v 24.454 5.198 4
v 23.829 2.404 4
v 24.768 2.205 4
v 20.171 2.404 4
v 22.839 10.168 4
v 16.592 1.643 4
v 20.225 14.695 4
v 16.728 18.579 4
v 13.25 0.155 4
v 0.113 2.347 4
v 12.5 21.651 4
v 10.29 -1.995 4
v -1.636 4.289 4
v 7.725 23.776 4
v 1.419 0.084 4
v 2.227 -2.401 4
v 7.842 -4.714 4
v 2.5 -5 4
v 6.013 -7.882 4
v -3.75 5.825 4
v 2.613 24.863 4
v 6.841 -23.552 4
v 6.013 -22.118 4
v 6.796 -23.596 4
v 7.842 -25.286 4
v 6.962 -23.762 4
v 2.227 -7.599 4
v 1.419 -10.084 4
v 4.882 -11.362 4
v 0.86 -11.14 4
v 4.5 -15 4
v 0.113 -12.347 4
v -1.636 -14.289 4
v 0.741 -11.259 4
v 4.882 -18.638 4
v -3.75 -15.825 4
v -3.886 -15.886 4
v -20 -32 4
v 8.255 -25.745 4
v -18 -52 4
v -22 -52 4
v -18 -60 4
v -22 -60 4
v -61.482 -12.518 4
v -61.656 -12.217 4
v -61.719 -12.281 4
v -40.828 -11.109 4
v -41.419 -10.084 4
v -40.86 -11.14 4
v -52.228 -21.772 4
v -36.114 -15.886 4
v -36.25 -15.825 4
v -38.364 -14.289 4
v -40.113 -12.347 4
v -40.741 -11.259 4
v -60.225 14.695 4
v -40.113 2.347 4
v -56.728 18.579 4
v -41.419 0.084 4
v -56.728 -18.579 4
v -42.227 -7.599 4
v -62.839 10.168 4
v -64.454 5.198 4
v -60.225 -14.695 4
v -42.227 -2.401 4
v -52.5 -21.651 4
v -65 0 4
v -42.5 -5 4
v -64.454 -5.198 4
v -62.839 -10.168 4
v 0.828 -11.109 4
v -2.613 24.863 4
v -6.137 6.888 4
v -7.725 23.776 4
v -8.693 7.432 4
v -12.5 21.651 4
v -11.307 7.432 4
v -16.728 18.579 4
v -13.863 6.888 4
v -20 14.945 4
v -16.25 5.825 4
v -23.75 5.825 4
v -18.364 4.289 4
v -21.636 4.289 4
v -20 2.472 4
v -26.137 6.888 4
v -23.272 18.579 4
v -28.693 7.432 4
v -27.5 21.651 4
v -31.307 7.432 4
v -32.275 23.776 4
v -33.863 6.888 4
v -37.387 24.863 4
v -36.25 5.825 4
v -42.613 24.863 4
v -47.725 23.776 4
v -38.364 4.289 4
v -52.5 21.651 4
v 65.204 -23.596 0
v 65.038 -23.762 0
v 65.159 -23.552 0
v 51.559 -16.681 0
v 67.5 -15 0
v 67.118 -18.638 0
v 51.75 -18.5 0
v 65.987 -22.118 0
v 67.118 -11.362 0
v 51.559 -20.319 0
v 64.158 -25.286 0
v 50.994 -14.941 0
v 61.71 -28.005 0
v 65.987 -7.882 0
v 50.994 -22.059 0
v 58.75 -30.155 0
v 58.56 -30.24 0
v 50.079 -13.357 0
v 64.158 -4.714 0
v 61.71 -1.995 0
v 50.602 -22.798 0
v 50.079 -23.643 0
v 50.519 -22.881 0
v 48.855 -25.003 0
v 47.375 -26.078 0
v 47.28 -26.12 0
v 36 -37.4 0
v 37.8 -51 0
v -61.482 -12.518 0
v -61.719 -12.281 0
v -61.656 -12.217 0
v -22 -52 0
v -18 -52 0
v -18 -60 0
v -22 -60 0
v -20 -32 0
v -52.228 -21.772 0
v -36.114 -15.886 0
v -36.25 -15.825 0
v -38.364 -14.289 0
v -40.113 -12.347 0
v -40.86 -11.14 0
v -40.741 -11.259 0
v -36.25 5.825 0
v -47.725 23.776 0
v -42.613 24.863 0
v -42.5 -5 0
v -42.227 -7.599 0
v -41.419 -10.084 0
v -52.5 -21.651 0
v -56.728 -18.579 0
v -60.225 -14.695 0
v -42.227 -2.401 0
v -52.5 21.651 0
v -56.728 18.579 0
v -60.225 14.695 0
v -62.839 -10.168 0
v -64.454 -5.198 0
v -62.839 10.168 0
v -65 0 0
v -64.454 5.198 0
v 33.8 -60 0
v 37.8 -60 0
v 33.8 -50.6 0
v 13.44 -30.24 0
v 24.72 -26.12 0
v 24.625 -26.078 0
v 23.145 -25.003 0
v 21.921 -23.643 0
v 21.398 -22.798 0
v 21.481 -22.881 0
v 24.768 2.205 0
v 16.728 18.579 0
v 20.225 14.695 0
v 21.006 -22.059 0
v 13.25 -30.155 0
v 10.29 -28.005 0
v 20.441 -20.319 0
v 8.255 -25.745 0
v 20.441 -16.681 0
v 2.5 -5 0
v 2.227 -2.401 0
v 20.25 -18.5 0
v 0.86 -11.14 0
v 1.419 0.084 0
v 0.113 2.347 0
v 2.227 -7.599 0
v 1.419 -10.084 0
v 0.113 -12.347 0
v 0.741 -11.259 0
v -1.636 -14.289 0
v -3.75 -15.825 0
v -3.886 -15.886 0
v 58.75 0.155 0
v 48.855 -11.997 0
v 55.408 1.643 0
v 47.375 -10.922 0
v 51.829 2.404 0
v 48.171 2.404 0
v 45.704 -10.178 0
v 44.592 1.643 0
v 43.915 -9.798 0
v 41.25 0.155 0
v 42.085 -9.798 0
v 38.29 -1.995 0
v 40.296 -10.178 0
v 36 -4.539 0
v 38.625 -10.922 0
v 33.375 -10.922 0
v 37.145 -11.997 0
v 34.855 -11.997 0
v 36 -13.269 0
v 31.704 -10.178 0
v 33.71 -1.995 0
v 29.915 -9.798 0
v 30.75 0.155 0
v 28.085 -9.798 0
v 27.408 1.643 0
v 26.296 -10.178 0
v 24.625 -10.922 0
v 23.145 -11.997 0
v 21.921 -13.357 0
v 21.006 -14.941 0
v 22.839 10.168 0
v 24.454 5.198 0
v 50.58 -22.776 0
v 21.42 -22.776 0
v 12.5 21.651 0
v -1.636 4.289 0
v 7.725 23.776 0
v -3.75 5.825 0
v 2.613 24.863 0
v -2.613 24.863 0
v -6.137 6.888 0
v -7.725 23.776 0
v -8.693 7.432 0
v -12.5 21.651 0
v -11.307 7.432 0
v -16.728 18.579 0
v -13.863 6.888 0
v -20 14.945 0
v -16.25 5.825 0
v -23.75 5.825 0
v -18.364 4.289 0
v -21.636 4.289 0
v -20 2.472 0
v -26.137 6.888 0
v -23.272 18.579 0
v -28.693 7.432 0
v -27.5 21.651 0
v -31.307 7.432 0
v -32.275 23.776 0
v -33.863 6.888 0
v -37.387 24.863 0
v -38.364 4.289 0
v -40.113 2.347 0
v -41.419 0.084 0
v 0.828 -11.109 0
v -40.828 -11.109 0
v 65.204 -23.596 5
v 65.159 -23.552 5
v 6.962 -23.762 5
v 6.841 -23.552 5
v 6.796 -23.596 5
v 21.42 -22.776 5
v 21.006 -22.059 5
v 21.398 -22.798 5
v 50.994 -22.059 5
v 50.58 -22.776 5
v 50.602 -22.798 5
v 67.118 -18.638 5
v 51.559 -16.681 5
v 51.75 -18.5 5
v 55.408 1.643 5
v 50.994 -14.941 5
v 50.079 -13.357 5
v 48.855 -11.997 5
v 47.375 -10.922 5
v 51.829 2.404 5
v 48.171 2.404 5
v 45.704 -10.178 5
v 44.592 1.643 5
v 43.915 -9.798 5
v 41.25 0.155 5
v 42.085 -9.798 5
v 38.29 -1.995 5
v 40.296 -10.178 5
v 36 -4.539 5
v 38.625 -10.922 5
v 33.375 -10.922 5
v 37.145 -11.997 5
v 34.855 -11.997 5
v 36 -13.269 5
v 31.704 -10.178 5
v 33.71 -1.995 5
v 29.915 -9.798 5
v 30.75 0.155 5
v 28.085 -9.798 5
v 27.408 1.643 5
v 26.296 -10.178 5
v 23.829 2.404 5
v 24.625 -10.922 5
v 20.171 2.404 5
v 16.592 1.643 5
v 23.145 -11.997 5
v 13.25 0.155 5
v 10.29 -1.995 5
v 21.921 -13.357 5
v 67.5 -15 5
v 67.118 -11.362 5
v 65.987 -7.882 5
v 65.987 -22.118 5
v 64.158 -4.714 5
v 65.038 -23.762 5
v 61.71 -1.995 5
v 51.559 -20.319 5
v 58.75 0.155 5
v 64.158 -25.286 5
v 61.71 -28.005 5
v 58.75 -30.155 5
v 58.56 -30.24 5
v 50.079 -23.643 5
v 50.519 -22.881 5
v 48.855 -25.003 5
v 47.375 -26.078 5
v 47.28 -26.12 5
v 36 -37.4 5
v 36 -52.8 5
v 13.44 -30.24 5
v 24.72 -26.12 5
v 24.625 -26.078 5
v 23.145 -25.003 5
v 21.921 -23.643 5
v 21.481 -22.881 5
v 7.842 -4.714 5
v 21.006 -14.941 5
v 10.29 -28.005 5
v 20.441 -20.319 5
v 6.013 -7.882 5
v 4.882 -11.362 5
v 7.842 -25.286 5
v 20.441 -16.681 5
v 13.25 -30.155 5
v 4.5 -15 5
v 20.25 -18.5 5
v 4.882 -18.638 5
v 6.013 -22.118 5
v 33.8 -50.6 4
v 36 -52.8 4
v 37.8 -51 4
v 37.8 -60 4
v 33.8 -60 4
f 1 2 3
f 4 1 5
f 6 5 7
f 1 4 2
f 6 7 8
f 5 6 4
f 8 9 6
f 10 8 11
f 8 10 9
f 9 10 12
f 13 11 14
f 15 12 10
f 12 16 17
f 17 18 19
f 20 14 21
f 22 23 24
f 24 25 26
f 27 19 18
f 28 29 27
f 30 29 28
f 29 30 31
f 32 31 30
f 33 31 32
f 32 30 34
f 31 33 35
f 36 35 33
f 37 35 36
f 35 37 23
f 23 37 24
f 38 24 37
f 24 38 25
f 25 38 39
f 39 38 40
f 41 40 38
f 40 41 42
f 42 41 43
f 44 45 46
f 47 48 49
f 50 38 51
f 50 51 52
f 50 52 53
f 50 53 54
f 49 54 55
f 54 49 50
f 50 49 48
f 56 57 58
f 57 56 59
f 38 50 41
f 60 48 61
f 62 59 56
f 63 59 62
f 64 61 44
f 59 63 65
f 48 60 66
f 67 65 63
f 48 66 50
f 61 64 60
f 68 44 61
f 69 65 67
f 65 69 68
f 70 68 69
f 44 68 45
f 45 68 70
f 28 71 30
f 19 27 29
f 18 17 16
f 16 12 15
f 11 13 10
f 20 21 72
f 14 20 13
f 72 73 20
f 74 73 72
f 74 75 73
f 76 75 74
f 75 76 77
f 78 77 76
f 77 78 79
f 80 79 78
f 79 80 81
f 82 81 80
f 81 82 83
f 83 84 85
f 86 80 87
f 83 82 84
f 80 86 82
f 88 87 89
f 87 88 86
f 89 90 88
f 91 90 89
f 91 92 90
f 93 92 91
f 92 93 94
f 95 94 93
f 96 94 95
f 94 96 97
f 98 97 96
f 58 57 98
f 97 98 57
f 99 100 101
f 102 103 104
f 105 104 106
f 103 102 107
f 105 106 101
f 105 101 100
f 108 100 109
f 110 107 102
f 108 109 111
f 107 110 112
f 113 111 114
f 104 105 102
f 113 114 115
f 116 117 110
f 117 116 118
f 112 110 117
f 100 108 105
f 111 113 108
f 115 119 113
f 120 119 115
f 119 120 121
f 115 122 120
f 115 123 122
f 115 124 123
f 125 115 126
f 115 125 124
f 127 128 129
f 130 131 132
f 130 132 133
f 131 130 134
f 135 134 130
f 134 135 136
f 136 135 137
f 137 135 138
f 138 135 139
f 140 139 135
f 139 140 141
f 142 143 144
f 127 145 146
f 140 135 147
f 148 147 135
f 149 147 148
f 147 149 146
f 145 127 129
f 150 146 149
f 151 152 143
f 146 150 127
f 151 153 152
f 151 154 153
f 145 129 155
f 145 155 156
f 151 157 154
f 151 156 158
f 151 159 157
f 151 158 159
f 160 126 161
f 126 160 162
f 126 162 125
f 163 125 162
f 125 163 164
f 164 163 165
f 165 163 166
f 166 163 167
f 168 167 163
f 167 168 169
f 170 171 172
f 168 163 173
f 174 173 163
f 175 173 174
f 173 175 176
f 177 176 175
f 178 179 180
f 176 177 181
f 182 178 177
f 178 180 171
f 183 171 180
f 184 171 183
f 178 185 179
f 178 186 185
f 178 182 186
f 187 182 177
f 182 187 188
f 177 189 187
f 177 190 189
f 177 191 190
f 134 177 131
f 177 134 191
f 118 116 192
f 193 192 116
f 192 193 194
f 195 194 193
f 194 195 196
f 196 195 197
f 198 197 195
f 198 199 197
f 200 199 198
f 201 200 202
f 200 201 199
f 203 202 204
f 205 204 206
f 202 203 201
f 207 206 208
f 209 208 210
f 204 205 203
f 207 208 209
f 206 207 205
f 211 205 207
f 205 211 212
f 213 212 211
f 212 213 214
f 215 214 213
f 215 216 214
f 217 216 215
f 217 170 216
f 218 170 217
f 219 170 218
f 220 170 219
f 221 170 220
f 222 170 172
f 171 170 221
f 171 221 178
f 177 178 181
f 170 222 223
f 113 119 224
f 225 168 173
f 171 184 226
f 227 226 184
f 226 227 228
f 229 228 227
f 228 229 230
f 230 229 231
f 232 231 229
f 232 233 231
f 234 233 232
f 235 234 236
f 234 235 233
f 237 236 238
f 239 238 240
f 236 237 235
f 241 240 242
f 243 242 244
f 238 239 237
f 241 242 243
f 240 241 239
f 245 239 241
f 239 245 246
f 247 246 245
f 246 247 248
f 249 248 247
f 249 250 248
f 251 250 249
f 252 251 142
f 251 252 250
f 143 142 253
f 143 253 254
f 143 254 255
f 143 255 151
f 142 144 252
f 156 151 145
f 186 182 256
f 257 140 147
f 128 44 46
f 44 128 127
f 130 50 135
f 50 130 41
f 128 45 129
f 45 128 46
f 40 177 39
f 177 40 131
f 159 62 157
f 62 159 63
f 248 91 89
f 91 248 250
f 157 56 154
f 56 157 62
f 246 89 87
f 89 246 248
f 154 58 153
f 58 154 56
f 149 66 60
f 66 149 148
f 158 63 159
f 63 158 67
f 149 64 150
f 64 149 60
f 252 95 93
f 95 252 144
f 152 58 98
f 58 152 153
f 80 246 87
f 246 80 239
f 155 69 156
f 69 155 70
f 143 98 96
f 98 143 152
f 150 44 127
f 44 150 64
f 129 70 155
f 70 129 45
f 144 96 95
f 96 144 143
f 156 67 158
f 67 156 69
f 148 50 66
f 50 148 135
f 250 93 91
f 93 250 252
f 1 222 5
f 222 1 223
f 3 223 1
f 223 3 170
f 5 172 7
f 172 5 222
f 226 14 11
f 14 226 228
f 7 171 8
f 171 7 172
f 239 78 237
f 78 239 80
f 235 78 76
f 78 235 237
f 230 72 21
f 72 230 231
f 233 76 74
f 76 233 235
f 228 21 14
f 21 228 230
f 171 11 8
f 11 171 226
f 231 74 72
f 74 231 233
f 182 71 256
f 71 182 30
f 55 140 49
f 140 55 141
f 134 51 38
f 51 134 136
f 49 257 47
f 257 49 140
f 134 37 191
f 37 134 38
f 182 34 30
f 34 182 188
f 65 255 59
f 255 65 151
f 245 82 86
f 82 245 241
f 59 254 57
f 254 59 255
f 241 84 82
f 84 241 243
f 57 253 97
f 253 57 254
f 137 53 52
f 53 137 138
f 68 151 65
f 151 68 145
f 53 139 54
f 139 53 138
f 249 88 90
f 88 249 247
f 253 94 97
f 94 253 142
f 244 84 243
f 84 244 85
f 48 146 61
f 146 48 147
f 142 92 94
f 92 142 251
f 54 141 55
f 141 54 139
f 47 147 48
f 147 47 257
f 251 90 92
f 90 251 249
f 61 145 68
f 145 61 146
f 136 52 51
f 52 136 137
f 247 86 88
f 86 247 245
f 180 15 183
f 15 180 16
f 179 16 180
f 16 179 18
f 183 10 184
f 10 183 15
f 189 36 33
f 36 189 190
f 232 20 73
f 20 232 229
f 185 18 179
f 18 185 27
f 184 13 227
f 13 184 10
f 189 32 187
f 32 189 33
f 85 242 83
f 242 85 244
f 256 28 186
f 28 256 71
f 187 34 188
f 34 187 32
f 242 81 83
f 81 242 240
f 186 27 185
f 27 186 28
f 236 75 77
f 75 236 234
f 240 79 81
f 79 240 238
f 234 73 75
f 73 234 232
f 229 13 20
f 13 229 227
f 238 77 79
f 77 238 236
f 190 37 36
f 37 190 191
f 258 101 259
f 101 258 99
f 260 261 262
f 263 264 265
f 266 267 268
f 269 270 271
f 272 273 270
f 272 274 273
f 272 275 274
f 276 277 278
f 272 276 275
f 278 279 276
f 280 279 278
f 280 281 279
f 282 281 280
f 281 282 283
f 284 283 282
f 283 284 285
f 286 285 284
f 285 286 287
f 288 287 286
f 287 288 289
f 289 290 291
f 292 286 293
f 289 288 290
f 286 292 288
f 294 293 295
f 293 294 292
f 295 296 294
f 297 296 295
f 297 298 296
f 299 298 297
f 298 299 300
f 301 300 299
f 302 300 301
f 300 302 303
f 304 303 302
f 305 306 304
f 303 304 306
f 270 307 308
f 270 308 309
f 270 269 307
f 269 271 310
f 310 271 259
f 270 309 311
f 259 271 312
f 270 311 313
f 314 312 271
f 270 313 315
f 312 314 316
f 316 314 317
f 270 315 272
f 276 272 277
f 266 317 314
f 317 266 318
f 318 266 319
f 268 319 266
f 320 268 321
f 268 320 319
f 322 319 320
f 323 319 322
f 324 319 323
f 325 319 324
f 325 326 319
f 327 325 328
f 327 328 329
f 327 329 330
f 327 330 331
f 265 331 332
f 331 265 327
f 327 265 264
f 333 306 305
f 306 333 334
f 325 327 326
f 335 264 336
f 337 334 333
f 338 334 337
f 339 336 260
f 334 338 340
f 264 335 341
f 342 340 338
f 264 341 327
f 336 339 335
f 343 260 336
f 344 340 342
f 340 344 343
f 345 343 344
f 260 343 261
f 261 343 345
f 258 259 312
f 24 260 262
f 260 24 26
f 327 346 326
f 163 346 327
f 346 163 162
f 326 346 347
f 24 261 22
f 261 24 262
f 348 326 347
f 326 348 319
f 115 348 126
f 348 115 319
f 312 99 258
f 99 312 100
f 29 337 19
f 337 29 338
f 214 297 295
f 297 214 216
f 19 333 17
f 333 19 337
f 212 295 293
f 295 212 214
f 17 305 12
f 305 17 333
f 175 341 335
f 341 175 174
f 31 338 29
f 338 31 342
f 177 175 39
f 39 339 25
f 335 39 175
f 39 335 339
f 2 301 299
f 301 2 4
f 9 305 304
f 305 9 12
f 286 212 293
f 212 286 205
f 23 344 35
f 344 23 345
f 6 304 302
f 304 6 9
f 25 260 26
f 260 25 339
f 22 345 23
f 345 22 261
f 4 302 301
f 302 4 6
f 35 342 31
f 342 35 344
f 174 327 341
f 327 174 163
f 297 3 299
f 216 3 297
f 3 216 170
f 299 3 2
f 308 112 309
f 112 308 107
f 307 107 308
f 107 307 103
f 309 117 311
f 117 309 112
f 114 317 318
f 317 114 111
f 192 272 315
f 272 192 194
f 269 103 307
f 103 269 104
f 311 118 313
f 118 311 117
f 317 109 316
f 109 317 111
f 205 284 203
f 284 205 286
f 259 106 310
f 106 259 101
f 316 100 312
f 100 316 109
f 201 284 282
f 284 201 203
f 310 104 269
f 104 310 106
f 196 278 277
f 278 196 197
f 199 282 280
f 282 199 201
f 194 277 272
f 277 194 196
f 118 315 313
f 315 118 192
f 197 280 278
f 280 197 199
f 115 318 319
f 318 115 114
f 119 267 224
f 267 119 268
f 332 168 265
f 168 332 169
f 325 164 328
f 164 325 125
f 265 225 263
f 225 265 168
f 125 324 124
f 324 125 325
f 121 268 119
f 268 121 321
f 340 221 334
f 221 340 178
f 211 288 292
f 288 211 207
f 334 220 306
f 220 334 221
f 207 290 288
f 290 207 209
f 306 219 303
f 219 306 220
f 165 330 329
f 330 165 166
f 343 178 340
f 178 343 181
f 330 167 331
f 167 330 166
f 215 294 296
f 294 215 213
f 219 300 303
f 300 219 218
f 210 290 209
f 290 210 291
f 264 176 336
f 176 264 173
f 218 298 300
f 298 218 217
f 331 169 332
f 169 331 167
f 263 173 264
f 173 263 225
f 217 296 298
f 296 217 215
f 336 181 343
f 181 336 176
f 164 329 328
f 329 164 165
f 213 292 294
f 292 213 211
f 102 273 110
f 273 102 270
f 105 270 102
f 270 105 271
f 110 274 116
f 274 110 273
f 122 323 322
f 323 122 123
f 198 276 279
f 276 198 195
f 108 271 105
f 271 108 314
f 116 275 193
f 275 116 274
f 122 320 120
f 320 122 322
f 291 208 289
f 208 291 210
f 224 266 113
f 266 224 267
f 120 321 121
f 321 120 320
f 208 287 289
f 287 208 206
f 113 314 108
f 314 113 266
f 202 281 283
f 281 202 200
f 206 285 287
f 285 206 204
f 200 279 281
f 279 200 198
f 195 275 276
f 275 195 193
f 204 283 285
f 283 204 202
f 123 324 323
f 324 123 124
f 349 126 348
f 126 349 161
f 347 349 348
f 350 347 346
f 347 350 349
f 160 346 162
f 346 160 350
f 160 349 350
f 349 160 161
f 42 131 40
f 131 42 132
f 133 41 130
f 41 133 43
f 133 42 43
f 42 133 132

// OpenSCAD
//1
 difference(){
 difference(){ 
  union(){
	translate([-40,0,0]) cylinder(4,25,25);
   	cylinder(4,25,25);

	translate([-20,-54,0]) rotate([0,0,45]) 
   difference(){
	cube([59,59,4]);
	translate([45,45,0]) cube([20,20,4]);
}
}
}
	translate([-10,-5,0])
	scale([0.5,0.5,1])
  difference(){
  union(){
	translate([-40,0,0]) cylinder(4,25,25);
   	cylinder(4,25,25);

	translate([-20,-54,0]) rotate([0,0,45]) 
  difference(){
	cube([59,59,4]);
	translate([45,45,0]) cube([20,20,4]);
}
}
}
}
	translate([-22,-60,0]) cube([4,10,4]);

//2
	translate([50,-15,0])
  union(){
	scale([0.7,0.7,1])
  difference(){
  difference(){
  union(){
	translate([-40,0,0]) cylinder(5,25,25);
   	cylinder(5,25,25);

	translate([-20,-54,0]) rotate([0,0,45]) 
  difference(){
	cube([59,59,5]);
	translate([45,45,0]) cube([20,20,5]);
}
}
}
	translate([-10,-5,0])
	scale([0.5,0.5,1])
  difference(){
  union(){
	translate([-40,0,0]) cylinder(5,25,25);
   	cylinder(5,25,25);

	translate([-20,-54,0]) rotate([0,0,45]) 
 difference(){	
	cube([59,59,5]);
	translate([45,45,0]) cube([20,20,5]);
}
}
}
}
	translate([-16.2,-45,0]) cube([4,10,4]);
}

 
